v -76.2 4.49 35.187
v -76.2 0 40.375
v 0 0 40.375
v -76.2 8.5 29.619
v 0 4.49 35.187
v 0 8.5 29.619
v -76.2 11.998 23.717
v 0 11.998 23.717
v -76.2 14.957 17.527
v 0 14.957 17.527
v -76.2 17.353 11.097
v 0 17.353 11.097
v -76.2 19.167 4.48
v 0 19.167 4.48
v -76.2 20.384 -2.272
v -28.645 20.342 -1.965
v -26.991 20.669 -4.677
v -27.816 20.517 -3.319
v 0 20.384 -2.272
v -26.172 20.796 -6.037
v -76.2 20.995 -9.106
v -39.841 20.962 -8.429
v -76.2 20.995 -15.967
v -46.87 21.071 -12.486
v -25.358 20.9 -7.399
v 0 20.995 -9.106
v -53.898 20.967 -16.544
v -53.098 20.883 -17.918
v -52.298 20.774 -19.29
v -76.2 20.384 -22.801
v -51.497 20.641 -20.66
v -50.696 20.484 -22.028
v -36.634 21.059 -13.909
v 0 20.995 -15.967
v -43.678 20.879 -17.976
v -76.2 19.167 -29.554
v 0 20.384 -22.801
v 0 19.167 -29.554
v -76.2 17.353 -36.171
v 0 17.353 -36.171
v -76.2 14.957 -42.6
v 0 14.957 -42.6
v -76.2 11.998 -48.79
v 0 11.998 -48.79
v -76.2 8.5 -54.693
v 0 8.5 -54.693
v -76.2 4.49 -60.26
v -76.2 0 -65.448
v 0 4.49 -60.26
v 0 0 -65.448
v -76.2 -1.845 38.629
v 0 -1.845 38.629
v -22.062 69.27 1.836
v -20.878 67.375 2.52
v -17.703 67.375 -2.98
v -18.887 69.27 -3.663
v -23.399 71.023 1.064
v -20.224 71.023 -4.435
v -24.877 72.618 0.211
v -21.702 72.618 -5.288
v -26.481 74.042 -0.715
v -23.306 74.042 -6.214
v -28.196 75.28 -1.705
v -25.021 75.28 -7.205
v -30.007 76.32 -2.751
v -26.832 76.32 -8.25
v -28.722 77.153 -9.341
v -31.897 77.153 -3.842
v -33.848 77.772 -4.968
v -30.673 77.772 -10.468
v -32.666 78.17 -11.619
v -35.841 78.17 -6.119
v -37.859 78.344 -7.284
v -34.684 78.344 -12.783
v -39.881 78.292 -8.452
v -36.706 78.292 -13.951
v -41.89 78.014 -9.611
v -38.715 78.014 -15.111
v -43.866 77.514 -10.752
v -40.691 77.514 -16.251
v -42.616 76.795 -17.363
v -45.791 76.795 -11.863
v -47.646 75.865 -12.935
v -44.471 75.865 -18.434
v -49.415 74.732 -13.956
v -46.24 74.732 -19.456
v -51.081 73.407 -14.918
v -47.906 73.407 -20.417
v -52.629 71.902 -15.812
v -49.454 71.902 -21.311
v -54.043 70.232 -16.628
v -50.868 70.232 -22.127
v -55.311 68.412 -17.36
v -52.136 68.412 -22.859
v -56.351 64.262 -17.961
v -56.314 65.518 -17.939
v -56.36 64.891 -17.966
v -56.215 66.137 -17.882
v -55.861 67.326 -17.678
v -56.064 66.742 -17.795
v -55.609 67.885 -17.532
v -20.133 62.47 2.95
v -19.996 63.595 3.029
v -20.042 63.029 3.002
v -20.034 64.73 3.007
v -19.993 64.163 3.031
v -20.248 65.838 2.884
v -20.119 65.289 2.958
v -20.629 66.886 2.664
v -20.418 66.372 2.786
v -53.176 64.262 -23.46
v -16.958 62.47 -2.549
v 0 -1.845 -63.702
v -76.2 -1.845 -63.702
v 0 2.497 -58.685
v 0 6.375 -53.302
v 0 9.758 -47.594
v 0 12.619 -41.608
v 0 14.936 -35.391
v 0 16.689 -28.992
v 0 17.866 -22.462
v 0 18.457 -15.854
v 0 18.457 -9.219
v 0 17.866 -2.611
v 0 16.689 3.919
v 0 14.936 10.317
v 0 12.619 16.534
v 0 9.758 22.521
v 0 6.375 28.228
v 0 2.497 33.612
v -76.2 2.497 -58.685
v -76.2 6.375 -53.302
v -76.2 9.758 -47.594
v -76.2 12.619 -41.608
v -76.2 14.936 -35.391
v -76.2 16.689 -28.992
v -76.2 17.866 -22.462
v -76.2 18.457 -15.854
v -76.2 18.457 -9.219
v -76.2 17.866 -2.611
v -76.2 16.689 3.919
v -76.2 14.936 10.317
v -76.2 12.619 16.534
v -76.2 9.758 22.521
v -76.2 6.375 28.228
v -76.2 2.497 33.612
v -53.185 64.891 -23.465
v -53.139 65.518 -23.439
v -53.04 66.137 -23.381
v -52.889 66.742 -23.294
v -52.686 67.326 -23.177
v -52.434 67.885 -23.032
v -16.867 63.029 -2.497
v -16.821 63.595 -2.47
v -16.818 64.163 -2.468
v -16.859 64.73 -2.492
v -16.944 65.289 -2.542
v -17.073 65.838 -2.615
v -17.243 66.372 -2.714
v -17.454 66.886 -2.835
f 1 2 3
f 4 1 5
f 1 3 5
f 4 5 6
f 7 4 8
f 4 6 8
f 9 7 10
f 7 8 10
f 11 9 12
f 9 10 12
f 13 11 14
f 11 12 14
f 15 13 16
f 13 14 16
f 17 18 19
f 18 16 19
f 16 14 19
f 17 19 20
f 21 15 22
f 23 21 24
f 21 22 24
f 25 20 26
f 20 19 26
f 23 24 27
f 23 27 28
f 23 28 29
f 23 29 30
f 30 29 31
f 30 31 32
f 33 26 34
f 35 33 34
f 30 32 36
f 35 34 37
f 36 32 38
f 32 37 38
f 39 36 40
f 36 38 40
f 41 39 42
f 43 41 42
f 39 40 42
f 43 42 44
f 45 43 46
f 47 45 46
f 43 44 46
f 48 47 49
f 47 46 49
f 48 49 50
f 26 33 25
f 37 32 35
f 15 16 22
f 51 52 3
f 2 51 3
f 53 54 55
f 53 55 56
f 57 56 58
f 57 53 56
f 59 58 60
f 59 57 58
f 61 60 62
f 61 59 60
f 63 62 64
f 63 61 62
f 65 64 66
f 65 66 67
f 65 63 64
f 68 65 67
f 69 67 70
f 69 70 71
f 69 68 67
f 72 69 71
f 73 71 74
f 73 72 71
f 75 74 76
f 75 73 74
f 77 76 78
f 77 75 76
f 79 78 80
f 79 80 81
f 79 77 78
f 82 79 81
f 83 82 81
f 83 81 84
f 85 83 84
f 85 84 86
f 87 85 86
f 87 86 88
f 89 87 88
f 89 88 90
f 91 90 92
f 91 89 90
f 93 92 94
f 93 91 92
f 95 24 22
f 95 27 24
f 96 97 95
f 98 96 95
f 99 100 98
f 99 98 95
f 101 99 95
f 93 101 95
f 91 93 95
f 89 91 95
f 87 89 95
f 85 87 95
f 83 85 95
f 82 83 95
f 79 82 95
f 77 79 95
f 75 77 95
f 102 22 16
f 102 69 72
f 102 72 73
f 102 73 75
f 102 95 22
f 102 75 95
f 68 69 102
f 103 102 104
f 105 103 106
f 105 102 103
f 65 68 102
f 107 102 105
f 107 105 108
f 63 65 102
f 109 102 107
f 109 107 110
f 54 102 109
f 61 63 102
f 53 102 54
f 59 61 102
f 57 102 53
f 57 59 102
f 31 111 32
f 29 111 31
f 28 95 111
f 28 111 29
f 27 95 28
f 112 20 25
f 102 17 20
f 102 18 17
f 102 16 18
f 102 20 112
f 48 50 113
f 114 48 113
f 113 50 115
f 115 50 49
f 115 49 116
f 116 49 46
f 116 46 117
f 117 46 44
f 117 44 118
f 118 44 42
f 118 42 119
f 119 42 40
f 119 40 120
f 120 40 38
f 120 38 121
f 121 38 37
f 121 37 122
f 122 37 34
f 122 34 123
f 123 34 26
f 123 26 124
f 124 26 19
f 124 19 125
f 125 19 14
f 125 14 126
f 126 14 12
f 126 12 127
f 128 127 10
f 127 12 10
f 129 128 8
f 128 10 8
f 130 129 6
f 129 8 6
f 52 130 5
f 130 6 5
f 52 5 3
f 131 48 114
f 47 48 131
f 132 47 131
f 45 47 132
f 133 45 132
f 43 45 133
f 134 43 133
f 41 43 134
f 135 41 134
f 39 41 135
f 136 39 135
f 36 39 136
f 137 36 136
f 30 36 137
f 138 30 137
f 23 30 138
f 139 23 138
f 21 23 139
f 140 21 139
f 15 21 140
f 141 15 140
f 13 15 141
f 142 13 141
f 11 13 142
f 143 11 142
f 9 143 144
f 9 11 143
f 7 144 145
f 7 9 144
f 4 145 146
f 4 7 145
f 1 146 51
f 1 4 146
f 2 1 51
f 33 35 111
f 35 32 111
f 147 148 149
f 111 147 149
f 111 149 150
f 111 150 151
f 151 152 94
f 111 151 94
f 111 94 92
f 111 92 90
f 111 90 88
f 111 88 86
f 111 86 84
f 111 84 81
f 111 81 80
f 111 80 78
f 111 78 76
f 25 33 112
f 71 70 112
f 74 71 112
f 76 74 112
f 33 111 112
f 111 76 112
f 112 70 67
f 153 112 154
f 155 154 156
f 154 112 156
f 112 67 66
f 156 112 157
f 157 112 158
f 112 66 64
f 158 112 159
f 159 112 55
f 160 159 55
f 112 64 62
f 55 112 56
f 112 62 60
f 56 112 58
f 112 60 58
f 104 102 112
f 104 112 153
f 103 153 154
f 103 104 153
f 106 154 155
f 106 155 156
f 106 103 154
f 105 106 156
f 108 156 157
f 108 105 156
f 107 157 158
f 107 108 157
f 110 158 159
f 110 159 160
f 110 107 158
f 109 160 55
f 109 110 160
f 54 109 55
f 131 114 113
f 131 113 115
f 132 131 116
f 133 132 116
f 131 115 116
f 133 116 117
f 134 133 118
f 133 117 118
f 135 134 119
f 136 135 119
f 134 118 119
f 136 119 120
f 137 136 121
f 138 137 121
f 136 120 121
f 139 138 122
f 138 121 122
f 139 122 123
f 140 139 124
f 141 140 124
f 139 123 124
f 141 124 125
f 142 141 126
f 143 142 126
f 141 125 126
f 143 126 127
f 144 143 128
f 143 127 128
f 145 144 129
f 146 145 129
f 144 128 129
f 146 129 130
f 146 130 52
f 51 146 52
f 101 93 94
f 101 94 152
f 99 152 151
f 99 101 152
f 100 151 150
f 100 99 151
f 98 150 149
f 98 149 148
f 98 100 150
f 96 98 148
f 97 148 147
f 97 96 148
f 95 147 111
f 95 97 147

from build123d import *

# Parameters (mm, degrees)
EXTRUDE_THIN1_DEPTH = 76.2
EXTRUDE3_DEPTH      = 3.175


with BuildPart() as part:
    # Sketch1 → Extrude-Thin1 (new body)
    with BuildSketch(Plane(origin=(0, 0, 0), x_dir=(0, 0, -1), z_dir=(1, 0, 0))):
        with BuildLine():
            ThreePointArc((-40.374745946, 0), (12.536707256, 21.071210286), (65.448160458, 0))
            Line((65.448160458, 0), (63.702043982, -1.84463472))
            ThreePointArc((63.702043982, -1.84463472), (12.536707256, 18.531210286), (-38.628629469, -1.84463472))
            Line((-38.628629469, -1.84463472), (-40.374745946, 0))
        make_face()
    extrude(amount=-EXTRUDE_THIN1_DEPTH)

    # Sketch8 → Extrude3 (add, symmetric)
    with BuildSketch(Plane(origin=(-4.723115477, 0, 8.180675976), x_dir=(0.8660254037844382, 0, 0.500000000000001), z_dir=(-0.500000000000001, 0, 0.8660254037844382))):
        with BuildLine():
            Line((-26.019914049, 19.356414404), (-15.960161332, 62.469762483))
            ThreePointArc((-15.960161332, 62.469762483), (-15.889687792, 65.010575746), (-16.821324096, 67.375475819))
            ThreePointArc((-16.821324096, 67.375475819), (-36.428592093, 78.343903744), (-56.580491048, 68.411515413))
            ThreePointArc((-56.580491048, 68.411515413), (-57.544908965, 66.441876013), (-57.781782094, 64.261630063))
            Line((-57.781782094, 64.261630063), (-54.843835108, 19.356414404))
            Line((-54.843835108, 19.356414404), (-26.019914049, 19.356414404))
        make_face()
    extrude(amount=EXTRUDE3_DEPTH, both=True)


solid = part.part
